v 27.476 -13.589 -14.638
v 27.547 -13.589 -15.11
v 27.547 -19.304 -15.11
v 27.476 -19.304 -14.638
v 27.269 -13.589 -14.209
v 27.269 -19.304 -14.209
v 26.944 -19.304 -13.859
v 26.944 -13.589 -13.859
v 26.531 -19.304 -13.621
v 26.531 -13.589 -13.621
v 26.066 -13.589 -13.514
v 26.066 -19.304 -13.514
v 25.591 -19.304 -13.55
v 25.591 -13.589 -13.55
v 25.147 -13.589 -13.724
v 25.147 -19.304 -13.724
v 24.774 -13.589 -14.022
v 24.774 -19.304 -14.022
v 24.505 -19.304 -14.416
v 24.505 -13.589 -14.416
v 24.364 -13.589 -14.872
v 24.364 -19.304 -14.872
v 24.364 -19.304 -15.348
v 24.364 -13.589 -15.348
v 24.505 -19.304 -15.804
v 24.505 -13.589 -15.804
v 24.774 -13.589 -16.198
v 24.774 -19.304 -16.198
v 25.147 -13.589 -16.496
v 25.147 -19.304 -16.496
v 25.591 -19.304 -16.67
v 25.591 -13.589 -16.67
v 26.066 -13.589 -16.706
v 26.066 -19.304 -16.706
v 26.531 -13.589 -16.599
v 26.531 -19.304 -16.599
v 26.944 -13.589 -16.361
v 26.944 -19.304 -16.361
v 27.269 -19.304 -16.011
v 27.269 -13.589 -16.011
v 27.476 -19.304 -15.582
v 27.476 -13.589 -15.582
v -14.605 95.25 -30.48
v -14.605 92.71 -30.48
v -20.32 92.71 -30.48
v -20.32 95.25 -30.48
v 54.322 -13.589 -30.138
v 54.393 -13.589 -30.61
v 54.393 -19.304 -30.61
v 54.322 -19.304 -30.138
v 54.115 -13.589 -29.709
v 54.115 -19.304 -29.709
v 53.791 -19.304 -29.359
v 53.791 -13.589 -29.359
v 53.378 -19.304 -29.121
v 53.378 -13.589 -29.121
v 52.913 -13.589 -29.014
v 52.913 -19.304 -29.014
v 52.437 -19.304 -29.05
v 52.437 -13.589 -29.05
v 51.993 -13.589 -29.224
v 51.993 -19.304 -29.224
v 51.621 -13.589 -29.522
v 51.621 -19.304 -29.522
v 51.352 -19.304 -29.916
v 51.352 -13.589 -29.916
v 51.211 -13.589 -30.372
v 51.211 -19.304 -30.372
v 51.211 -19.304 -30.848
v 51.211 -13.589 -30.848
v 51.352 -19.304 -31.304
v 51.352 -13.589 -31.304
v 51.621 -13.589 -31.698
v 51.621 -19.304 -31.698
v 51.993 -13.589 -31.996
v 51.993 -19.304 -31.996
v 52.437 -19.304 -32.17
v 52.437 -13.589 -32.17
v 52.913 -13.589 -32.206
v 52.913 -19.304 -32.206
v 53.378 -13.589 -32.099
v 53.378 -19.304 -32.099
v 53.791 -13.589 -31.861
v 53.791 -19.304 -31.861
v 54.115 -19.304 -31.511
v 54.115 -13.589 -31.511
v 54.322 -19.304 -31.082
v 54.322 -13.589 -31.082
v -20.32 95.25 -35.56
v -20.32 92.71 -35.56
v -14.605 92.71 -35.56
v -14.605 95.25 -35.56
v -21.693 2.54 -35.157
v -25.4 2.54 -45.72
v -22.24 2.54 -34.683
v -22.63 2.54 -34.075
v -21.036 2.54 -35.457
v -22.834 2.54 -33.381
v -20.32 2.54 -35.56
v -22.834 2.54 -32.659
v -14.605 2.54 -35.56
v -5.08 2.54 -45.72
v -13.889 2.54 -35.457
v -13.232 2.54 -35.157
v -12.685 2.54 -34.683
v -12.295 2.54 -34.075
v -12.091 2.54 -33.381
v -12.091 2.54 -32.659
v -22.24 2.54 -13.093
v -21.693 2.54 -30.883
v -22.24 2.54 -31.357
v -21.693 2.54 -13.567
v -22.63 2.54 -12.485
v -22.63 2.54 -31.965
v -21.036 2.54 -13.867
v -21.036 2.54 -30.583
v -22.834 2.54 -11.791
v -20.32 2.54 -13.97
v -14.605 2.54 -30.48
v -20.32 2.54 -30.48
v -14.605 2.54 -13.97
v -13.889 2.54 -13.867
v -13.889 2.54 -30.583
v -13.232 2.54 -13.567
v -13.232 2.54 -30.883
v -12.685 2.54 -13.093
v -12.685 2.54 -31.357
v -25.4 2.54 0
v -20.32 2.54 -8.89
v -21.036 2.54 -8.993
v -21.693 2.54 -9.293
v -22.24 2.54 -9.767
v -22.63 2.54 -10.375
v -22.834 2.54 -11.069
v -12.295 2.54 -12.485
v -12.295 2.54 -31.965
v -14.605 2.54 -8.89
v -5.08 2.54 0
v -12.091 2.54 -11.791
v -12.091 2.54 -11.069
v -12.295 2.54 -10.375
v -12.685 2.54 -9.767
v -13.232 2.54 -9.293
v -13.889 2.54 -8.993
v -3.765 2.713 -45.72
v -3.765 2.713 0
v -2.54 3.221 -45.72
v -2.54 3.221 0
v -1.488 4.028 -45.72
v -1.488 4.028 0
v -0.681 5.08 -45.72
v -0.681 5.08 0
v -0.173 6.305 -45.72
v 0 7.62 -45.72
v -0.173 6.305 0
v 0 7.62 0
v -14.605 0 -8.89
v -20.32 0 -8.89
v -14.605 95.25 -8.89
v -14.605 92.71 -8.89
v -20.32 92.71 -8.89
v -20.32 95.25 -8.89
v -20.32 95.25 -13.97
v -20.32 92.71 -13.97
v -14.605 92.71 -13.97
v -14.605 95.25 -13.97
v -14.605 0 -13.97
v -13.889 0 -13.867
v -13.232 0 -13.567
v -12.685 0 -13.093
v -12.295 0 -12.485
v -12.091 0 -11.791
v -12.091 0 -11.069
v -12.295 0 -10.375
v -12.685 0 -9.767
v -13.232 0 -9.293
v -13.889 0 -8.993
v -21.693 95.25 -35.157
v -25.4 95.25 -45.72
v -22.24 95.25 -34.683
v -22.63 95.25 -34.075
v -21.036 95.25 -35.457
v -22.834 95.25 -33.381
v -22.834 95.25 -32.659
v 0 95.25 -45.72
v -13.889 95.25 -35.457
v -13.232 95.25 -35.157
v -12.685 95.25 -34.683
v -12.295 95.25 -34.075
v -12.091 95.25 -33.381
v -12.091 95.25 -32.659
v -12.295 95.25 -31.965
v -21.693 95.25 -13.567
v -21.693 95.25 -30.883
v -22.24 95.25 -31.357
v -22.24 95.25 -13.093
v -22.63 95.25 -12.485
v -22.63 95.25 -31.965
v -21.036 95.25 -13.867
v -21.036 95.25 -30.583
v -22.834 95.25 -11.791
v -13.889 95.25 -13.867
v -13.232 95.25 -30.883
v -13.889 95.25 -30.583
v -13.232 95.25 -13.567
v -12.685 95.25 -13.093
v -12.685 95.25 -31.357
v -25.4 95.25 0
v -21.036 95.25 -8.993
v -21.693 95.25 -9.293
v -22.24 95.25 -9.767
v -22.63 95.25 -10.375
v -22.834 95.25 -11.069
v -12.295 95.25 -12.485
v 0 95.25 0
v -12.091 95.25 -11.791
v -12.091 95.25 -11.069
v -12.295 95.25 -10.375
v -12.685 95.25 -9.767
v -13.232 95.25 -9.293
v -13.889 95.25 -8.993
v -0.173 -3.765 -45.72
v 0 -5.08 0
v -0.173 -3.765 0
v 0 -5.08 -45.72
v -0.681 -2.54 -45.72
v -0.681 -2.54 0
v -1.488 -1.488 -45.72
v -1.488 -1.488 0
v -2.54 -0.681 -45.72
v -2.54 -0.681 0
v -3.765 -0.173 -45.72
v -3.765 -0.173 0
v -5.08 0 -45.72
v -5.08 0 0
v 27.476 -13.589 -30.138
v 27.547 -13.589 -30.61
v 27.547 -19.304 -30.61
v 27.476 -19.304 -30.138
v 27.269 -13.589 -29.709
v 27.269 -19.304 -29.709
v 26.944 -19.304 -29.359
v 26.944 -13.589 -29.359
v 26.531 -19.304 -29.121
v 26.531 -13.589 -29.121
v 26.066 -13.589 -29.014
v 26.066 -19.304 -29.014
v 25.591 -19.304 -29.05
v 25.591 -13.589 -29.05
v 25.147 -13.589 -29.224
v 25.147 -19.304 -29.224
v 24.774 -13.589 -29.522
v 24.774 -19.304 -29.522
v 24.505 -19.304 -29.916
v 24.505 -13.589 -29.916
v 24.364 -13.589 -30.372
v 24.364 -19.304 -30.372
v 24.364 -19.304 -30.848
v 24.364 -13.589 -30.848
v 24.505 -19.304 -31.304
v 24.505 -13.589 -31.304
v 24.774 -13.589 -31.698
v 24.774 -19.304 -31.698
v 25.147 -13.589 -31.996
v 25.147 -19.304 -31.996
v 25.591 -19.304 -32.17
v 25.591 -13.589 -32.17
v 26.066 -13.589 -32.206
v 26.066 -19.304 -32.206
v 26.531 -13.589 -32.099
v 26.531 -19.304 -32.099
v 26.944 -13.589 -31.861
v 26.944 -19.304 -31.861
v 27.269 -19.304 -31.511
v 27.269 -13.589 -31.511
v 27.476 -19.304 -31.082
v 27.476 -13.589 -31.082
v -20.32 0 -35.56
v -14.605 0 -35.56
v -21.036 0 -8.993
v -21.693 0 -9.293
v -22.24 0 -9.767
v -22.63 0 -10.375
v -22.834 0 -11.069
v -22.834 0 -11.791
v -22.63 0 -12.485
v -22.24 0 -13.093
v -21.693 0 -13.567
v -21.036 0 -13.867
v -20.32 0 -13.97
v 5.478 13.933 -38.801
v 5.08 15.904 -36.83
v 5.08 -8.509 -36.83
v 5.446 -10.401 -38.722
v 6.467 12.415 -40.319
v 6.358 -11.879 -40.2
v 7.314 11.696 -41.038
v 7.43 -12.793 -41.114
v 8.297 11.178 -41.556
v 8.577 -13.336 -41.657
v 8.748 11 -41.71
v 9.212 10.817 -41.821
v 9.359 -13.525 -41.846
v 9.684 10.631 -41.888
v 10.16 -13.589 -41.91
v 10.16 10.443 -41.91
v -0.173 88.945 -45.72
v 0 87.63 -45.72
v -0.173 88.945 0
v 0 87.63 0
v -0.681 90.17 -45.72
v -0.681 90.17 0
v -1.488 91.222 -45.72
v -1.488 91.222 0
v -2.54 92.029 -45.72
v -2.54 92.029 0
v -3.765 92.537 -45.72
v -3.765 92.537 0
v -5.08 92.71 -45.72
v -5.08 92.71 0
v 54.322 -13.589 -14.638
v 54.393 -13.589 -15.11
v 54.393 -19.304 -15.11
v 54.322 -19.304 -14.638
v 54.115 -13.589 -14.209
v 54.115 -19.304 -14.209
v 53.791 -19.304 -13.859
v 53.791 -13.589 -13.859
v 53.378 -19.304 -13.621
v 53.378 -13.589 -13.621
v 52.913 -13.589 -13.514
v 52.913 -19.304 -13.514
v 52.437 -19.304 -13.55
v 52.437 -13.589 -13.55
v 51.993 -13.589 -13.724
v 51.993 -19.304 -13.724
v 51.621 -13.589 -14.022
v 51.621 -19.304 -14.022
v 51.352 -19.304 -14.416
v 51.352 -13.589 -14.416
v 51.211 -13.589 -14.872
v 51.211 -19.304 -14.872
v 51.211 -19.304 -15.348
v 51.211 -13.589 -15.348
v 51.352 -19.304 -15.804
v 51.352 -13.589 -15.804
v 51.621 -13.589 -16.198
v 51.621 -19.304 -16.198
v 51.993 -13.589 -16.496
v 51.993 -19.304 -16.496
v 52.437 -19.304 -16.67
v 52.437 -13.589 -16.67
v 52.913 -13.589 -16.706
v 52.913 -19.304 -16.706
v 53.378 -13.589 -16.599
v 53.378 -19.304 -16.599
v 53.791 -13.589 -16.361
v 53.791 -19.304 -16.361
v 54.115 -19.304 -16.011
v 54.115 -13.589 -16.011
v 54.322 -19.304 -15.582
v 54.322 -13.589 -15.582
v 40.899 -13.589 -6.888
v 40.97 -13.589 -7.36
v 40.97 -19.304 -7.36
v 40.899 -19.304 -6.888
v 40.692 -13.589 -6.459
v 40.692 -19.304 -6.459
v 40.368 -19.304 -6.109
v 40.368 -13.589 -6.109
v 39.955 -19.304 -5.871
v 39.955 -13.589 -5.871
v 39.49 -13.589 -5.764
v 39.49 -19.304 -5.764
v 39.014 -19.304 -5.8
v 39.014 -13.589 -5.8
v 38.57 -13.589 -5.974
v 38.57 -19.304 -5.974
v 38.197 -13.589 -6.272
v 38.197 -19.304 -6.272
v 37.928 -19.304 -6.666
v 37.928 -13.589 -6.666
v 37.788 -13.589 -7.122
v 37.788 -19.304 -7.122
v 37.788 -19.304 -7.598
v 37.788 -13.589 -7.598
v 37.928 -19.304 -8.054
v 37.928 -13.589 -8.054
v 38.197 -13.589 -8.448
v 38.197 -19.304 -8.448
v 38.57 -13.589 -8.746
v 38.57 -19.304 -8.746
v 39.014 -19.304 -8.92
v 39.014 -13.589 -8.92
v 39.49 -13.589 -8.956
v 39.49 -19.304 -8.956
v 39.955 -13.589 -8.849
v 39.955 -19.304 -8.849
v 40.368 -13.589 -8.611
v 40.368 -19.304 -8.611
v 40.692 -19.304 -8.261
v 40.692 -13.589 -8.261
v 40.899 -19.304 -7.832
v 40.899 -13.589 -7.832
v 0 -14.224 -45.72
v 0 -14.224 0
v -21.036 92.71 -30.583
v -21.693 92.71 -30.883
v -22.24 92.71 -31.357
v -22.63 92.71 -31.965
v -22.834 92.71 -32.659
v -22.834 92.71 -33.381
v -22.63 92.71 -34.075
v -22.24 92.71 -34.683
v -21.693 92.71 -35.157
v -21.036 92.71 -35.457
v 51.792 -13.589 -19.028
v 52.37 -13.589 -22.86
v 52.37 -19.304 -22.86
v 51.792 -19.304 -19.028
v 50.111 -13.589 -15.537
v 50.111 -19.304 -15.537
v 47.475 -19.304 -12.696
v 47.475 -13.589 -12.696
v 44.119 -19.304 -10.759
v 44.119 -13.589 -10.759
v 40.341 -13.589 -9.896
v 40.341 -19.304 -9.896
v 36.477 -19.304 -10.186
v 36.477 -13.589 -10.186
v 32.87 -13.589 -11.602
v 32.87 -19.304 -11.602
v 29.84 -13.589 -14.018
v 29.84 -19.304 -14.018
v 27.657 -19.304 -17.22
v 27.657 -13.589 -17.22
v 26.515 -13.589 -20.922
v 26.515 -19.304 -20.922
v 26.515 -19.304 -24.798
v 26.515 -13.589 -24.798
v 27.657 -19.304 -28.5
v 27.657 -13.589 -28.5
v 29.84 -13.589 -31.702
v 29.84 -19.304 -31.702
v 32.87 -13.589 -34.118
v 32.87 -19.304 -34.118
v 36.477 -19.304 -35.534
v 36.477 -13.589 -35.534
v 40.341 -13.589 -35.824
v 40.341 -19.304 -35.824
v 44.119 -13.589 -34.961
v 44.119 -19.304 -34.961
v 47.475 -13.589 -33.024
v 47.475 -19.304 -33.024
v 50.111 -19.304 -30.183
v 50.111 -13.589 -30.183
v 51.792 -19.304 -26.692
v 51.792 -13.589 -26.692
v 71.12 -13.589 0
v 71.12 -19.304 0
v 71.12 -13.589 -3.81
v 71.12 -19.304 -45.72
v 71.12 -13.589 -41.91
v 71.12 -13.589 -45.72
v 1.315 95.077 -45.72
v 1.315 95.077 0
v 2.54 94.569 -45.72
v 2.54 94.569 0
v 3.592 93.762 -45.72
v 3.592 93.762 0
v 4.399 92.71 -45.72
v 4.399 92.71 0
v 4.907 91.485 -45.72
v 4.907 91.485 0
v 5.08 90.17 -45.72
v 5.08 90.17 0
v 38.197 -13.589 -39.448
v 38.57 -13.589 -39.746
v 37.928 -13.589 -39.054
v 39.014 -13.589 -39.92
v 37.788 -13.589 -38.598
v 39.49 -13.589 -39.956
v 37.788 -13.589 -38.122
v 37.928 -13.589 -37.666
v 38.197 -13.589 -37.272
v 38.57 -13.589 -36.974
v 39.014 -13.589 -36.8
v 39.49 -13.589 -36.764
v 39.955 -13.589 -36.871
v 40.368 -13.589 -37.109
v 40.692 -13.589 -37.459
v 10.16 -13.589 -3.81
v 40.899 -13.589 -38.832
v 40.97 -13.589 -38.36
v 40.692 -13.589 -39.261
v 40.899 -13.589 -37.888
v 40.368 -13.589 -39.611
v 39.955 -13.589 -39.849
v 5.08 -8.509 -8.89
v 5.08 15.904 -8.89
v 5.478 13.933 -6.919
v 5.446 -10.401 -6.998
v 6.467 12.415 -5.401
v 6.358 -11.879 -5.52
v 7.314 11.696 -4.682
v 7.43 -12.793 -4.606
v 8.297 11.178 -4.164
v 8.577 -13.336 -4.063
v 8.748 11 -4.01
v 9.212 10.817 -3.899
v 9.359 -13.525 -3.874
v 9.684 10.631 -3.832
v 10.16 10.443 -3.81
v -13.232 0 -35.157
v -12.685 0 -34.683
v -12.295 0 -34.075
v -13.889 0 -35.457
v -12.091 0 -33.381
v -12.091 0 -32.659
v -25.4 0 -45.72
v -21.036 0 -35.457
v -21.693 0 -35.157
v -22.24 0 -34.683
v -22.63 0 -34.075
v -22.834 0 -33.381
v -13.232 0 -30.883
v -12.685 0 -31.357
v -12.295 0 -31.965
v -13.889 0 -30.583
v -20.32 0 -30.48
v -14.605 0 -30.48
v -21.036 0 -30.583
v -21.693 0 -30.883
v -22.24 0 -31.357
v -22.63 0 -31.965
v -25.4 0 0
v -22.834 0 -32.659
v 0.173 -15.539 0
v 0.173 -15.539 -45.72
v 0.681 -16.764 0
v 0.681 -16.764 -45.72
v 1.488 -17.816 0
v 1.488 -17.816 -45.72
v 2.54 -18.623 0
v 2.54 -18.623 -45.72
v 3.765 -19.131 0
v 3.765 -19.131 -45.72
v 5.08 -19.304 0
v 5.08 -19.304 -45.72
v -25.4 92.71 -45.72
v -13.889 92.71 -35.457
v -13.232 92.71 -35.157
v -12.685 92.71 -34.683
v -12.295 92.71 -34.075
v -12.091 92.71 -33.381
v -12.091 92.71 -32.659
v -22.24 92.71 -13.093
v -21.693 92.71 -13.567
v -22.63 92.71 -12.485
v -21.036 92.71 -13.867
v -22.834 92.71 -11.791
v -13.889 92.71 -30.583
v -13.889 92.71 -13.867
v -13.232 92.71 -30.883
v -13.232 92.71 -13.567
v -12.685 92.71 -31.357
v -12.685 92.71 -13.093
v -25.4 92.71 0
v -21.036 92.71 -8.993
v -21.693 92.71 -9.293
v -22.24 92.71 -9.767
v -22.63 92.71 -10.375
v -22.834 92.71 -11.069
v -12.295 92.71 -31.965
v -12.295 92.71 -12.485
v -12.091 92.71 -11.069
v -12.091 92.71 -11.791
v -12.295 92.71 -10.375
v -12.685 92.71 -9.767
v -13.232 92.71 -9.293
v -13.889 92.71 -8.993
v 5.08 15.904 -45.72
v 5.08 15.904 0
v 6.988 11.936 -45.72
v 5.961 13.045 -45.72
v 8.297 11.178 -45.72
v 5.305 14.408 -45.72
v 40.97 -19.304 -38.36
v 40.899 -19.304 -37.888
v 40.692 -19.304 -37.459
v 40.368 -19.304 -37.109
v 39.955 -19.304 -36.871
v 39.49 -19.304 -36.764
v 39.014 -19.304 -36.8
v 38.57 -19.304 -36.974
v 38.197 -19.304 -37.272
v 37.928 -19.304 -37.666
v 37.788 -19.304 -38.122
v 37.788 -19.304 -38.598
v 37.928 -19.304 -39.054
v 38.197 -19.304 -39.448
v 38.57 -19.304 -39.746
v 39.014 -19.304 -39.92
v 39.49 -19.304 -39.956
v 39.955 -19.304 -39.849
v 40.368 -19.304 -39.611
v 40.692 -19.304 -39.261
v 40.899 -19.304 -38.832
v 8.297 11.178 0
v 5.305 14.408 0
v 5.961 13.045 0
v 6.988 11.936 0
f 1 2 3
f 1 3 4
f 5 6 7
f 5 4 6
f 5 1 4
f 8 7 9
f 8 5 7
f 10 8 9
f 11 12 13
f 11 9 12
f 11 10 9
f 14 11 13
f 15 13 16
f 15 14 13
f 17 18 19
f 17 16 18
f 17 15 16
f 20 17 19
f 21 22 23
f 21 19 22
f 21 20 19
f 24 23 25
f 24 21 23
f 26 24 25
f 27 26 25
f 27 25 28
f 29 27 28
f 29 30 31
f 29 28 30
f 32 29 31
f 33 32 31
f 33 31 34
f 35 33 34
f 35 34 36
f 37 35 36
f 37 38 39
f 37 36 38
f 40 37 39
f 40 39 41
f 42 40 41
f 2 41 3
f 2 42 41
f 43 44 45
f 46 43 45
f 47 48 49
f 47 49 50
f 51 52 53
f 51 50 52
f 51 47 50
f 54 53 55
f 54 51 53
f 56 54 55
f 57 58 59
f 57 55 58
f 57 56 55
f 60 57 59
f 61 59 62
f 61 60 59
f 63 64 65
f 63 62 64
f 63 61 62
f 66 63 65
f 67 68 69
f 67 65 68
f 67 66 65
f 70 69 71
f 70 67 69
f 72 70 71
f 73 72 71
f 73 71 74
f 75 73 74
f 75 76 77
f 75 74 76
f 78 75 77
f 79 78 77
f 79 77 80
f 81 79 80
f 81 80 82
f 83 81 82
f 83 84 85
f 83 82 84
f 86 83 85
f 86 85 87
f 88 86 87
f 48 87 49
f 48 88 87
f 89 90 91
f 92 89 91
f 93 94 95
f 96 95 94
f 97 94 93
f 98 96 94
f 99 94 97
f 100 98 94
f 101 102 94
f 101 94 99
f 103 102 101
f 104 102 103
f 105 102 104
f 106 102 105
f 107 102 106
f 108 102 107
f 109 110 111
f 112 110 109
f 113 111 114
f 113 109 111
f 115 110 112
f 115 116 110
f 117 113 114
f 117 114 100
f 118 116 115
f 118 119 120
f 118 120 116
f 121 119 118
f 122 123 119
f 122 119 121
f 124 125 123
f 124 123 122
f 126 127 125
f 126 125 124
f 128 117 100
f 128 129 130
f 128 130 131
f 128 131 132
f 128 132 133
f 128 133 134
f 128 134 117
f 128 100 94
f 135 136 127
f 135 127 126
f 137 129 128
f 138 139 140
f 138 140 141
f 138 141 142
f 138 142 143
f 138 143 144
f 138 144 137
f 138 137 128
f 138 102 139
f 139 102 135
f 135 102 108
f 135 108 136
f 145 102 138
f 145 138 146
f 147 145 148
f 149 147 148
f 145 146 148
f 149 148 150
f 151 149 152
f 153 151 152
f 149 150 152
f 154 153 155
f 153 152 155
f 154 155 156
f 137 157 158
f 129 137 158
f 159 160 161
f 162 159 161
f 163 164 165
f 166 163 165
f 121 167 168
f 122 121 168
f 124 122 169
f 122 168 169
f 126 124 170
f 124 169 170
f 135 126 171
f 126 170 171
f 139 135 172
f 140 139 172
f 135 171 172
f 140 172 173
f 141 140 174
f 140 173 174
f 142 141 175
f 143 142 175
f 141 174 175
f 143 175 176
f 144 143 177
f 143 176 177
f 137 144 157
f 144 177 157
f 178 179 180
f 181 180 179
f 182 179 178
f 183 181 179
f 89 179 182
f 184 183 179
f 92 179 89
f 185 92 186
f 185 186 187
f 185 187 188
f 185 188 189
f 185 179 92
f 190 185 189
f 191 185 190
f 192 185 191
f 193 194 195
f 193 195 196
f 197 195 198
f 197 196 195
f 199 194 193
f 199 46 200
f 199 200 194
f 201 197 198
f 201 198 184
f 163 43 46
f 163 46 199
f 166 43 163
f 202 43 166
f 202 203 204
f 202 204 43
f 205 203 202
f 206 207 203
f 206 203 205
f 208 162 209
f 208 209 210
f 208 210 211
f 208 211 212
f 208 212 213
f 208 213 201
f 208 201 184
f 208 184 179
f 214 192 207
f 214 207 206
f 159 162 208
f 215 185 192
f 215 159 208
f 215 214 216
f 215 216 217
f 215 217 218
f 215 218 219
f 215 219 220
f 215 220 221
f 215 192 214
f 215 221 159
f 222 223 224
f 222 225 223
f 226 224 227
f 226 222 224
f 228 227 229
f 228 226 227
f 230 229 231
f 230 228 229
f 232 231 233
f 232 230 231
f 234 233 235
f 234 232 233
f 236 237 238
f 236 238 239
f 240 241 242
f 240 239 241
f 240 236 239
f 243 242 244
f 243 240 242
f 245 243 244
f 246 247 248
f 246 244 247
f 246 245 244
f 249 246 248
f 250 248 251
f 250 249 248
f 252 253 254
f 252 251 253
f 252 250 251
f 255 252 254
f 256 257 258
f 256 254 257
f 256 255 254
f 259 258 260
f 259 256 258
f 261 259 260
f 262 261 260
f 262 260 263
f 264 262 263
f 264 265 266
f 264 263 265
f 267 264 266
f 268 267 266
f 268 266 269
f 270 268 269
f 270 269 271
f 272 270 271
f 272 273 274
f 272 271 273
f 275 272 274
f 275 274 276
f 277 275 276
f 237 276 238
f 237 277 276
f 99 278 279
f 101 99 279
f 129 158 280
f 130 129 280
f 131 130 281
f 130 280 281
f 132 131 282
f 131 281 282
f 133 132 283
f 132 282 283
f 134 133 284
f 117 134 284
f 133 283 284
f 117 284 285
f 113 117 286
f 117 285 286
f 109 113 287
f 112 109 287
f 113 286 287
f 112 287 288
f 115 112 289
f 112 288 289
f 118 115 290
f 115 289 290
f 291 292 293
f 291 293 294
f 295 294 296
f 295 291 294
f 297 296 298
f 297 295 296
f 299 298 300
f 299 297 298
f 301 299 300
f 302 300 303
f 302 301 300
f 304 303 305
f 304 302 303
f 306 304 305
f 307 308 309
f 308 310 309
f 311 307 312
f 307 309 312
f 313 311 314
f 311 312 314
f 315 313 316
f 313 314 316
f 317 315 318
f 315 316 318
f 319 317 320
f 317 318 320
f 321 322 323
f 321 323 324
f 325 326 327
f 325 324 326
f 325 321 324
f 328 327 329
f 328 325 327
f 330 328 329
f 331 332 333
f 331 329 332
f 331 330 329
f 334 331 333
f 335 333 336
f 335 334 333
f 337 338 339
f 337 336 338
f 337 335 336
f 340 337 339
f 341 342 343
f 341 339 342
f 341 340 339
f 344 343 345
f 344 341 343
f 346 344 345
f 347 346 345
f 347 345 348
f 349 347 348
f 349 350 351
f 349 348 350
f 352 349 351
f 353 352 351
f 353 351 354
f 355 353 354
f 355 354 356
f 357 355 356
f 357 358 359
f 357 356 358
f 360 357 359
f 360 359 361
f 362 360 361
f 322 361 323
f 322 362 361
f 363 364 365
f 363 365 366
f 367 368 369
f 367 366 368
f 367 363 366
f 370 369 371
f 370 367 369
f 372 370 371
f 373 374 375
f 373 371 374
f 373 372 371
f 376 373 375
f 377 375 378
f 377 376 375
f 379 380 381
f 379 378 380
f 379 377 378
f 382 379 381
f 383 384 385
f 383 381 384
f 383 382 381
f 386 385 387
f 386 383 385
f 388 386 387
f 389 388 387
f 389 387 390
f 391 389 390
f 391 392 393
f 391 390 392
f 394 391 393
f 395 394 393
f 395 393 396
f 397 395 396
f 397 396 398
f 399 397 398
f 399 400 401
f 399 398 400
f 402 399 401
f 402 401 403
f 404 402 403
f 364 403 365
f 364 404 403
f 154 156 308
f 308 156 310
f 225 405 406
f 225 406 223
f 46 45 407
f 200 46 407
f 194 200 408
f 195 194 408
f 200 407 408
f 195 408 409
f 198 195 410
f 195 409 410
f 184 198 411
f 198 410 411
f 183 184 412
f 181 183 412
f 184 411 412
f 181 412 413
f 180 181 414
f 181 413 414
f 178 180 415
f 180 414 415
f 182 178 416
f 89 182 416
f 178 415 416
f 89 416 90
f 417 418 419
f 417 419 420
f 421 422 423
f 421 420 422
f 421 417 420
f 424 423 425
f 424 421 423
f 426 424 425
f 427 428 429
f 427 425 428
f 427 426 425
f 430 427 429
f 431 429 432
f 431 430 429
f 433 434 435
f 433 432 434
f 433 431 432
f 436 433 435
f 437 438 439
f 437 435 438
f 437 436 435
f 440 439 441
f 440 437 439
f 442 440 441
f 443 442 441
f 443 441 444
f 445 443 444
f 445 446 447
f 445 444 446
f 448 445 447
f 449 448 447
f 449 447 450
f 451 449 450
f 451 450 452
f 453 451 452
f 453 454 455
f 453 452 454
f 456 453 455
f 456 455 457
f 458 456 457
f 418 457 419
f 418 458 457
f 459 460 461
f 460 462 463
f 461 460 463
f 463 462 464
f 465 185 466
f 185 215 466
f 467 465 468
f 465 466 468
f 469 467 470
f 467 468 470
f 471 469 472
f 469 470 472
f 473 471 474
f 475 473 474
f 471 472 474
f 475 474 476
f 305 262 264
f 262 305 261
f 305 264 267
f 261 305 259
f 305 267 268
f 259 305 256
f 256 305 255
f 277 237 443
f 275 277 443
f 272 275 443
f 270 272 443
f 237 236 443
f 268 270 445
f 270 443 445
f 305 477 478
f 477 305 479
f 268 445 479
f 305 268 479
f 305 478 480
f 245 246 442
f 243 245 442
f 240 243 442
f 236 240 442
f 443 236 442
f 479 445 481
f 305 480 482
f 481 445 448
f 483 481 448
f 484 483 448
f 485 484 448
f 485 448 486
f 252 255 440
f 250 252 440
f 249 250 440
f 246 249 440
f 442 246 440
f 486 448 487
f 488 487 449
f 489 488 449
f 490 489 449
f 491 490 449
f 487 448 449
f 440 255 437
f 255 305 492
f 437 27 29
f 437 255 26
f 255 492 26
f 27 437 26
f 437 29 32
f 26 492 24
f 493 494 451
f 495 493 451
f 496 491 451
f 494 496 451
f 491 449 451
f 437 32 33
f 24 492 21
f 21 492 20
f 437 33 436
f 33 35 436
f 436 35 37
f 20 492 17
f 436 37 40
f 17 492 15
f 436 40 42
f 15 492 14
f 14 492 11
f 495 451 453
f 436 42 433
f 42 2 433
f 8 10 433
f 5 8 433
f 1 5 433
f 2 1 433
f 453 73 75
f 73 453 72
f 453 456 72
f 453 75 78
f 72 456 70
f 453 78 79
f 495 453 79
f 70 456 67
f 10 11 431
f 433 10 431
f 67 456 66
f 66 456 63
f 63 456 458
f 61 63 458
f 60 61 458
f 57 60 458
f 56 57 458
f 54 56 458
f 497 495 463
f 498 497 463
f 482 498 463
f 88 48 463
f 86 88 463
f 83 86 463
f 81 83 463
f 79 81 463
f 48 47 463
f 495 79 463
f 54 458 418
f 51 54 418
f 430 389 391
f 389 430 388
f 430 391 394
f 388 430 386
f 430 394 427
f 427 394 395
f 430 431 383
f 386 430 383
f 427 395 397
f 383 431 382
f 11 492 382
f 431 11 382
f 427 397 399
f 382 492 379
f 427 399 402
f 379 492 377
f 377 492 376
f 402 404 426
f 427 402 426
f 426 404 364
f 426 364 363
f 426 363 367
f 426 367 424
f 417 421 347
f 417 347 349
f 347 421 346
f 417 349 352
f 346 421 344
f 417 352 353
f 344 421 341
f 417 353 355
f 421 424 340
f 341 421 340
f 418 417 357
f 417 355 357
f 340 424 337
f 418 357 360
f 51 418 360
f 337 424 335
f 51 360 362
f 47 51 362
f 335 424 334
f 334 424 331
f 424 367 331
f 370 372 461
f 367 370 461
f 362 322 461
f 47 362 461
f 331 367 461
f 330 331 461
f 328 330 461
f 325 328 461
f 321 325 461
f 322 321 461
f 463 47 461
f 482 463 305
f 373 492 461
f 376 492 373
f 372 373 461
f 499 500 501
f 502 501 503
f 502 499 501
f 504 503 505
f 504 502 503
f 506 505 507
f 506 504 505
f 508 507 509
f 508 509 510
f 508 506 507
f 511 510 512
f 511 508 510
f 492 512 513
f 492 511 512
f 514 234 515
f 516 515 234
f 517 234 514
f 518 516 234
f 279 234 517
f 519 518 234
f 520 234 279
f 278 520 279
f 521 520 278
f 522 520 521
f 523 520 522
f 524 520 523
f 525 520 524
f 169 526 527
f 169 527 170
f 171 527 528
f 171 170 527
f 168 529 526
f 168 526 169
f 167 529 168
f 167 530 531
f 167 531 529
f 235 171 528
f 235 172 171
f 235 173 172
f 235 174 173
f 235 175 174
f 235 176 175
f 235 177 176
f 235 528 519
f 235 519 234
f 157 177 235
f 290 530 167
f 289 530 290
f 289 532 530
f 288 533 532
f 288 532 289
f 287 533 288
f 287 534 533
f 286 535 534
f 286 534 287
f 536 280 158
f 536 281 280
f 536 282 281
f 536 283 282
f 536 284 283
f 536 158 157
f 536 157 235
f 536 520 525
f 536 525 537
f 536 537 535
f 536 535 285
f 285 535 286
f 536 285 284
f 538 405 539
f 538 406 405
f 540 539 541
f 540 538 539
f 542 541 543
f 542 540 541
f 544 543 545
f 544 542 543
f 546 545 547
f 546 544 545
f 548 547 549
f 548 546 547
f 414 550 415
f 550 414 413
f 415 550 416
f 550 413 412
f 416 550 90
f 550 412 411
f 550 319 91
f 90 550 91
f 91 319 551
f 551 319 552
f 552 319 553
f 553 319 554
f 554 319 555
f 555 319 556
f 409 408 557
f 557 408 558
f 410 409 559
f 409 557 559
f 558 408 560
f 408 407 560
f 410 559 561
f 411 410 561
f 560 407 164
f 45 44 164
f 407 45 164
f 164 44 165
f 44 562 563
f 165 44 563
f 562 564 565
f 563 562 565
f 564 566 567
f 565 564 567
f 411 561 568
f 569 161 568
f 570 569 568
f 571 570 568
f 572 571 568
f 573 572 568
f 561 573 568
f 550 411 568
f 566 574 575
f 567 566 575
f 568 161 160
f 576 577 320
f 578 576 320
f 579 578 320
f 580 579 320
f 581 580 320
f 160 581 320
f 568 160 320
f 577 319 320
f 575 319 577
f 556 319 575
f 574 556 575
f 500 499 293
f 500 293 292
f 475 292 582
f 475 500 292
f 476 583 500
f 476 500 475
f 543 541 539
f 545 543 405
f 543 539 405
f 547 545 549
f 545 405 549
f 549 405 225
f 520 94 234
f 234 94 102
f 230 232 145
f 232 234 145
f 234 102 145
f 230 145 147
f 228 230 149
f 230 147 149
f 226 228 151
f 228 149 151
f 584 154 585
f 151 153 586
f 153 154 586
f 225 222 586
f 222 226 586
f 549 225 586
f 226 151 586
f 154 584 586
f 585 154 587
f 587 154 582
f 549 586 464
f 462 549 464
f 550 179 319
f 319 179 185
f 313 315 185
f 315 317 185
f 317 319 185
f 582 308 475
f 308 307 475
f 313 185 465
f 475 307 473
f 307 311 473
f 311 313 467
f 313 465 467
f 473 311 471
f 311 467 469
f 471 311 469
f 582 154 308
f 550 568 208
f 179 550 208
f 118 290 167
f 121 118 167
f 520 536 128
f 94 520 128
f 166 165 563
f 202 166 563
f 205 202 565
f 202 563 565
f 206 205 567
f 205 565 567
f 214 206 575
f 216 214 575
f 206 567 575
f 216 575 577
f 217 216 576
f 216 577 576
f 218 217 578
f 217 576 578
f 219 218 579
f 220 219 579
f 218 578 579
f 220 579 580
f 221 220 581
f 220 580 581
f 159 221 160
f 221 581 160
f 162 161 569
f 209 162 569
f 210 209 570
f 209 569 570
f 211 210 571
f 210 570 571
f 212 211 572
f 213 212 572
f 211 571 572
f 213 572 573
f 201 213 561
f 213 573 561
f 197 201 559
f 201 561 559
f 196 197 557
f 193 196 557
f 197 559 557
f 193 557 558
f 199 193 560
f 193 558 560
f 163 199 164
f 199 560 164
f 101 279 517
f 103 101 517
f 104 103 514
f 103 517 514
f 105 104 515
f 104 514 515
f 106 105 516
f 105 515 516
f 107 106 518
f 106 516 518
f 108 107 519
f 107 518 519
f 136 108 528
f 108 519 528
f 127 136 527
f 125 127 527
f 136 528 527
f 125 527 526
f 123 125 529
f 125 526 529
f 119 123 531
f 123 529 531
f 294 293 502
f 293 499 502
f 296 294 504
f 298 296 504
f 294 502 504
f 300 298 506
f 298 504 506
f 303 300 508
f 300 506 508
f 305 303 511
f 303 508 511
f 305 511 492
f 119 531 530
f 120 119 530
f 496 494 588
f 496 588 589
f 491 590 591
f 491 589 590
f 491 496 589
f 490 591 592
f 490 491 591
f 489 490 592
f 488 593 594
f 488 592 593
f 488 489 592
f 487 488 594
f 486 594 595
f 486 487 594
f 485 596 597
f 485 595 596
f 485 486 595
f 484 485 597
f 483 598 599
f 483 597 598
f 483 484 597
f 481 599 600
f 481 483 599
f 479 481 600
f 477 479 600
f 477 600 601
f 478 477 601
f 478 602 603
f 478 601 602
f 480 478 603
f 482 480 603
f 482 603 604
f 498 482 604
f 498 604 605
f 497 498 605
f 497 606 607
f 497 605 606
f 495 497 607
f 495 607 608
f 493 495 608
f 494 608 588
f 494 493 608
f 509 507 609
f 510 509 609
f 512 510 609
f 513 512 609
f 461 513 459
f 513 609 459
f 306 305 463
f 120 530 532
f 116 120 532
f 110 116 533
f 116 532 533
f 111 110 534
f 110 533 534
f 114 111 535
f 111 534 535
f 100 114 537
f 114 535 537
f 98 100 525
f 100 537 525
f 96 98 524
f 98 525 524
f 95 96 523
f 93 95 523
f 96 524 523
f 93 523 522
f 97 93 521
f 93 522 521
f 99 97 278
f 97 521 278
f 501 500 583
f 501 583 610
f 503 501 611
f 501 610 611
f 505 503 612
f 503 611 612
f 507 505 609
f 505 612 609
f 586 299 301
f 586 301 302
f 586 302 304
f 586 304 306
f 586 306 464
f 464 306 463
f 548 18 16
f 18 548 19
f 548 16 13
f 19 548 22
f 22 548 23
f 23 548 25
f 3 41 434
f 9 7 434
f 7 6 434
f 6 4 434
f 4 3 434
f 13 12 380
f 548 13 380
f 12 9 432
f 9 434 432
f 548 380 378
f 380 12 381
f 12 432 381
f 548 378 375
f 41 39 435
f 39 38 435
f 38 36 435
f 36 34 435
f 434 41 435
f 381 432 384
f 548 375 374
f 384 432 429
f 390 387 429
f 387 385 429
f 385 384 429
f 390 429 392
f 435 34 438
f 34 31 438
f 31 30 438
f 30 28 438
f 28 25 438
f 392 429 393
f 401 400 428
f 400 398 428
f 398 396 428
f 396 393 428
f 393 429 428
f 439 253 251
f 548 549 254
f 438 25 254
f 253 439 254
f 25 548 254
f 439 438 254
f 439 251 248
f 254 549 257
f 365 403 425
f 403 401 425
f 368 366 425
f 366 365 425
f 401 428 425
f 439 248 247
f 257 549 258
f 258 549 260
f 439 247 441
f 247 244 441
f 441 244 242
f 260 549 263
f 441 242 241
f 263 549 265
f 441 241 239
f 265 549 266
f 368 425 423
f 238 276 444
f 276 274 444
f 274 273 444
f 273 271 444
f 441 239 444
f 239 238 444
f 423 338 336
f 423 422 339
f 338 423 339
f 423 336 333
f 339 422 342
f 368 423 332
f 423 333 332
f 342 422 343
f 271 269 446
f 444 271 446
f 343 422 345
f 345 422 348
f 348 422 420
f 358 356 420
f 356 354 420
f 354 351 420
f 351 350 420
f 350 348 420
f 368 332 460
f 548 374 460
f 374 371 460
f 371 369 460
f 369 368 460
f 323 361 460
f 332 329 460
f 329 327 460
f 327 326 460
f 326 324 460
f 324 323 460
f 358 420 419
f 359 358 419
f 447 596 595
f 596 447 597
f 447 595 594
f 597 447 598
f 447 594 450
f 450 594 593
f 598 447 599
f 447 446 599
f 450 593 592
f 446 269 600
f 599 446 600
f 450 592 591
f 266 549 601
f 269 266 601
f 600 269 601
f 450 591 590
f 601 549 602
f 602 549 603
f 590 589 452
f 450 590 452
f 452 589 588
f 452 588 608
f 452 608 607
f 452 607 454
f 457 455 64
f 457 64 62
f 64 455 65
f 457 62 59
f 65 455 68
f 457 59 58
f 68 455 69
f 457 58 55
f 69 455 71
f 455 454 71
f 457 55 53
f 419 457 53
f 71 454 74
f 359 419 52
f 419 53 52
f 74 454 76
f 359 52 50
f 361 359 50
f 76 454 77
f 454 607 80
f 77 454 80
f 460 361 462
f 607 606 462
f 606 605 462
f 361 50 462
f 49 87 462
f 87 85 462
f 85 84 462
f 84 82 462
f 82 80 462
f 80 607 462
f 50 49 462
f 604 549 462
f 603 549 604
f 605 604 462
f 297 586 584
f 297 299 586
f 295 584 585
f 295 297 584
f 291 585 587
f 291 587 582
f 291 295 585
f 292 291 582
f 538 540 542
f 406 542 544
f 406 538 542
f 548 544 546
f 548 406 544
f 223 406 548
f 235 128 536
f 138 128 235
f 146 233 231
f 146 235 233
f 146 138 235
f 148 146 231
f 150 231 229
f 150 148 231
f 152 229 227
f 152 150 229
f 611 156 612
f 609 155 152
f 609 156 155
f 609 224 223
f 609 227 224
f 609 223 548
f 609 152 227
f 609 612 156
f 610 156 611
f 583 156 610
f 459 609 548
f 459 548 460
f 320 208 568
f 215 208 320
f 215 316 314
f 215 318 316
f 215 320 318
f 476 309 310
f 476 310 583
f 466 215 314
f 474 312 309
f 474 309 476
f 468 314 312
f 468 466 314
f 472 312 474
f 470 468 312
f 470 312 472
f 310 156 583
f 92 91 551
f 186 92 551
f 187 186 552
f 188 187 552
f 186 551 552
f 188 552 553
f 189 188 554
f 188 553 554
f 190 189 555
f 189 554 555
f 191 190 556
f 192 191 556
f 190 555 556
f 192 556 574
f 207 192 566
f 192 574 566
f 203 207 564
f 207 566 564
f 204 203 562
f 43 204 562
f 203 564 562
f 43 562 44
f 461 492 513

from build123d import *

# Parameters (mm, degrees)
F0_W           = 95.25
F0_H           = 45.72
F1_DEPTH       = 5.08
F2_W           = 2.54
F2_H           = 45.72
F3_DEPTH       = 25.4
F5_DEPTH       = 95.251
F5_DEPTH_BACK  = 163
F8_W           = 71.12
F8_H           = 31.75
F9_DEPTH       = 22.86
F9_DEPTH_BACK  = 22.86
F10_W          = 66.04
F10_H          = 38.1
F11_DEPTH      = 95.251
F11_DEPTH_BACK = 13.589
F13_DEPTH      = 45.721
F13_DEPTH_BACK = 190
F14_R          = 1.6
F14_R_2        = 13
F15_DEPTH      = 19.305
F16_R          = 5.08


# Not quite as in the source:
# - an extrude ends at something that could not be found from the text; its depth is read off the source's solid


with BuildPart() as f1:
    # F0 (on Right) → F1 (new body)
    with BuildSketch(Plane.YZ):
        with Locations((47.625, -22.86)):
            Rectangle(F0_W, F0_H)
    extrude(amount=F1_DEPTH)

    # F2 (on Right) → F3 (join)
    with BuildSketch(Plane.YZ):
        with Locations((93.98, -22.86)):
            Rectangle(F2_W, F2_H)
        with Locations((1.27, -22.86)):
            Rectangle(F2_W, F2_H)
    extrude(amount=-F3_DEPTH)

    # F4 (on Front) → F5 (cut, two sides)
    with BuildSketch(Plane.XZ) as f5_sk:
        with BuildLine():
            Line((-20.32, -13.97), (-14.605, -13.97))
            ThreePointArc((-14.605, -13.97), (-12.065, -11.43), (-14.605, -8.89))
            Line((-14.605, -8.89), (-20.32, -8.89))
            ThreePointArc((-20.32, -8.89), (-22.86, -11.43), (-20.32, -13.97))
        make_face()
        with BuildLine():
            Line((-20.32, -35.56), (-14.605, -35.56))
            ThreePointArc((-14.605, -35.56), (-12.065, -33.02), (-14.605, -30.48))
            Line((-14.605, -30.48), (-20.32, -30.48))
            ThreePointArc((-20.32, -30.48), (-22.86, -33.02), (-20.32, -35.56))
        make_face()
    extrude(amount=-F5_DEPTH, mode=Mode.SUBTRACT)
    extrude(f5_sk.sketch, amount=F5_DEPTH_BACK, mode=Mode.SUBTRACT)

    # F8 (on plane+point) → F9 (join, two sides)
    with BuildSketch(Plane.XY.offset(-22.86)) as f9_sk:
        with Locations((35.56, -3.429)):
            Rectangle(F8_W, F8_H)
    extrude(amount=-F9_DEPTH)
    extrude(f9_sk.sketch, amount=F9_DEPTH_BACK)

    # F10 (on Front) → F11 (cut, two sides)
    with BuildSketch(Plane.XZ) as f11_sk:
        with Locations((38.1, -22.86)):
            Rectangle(F10_W, F10_H)
    extrude(amount=-F11_DEPTH, mode=Mode.SUBTRACT)
    extrude(f11_sk.sketch, amount=F11_DEPTH_BACK, mode=Mode.SUBTRACT)

    # F12 (on Top) → F13 (cut, two sides)
    with BuildSketch(Plane.XY) as f13_sk:
        Polygon((5.08, 12.446), (71.12, -13.589), (71.12, 12.446), align=None)
    extrude(amount=-F13_DEPTH, mode=Mode.SUBTRACT)
    extrude(f13_sk.sketch, amount=F13_DEPTH_BACK, mode=Mode.SUBTRACT)

    # F14 (on Front) → F15 (cut, through all)
    with BuildSketch(Plane.XZ):
        with Locations((39.37, -7.36)):
            Circle(F14_R)
        with Locations((25.9466062413, -15.11)):
            Circle(F14_R)
        with Locations((25.9466062413, -30.61)):
            Circle(F14_R)
        with Locations((39.37, -38.36)):
            Circle(F14_R)
        with Locations((52.7933937587, -30.61)):
            Circle(F14_R)
        with Locations((52.7933937587, -15.11)):
            Circle(F14_R)
        with Locations((39.37, -22.86)):
            Circle(F14_R_2)
    extrude(amount=F15_DEPTH, mode=Mode.SUBTRACT)

    # F16
    f16_edges = [f1.edges().sort_by_distance(p)[0] for p in [
        (0, 92.71, -22.86),
        (0, 2.54, -22.86),
        (0, 0, -22.86),
        (0, -19.304, -22.86),
        (5.08, -13.589, -22.86),
        (5.08, -0.5715, -3.81),
        (5.08, -0.5715, -41.91),
        (5.08, 12.446, -1.905),
        (5.08, 12.446, -43.815),
        (5.08, 95.25, -22.86),
    ]]
    fillet(f16_edges, radius=F16_R)


solid = f1.part
